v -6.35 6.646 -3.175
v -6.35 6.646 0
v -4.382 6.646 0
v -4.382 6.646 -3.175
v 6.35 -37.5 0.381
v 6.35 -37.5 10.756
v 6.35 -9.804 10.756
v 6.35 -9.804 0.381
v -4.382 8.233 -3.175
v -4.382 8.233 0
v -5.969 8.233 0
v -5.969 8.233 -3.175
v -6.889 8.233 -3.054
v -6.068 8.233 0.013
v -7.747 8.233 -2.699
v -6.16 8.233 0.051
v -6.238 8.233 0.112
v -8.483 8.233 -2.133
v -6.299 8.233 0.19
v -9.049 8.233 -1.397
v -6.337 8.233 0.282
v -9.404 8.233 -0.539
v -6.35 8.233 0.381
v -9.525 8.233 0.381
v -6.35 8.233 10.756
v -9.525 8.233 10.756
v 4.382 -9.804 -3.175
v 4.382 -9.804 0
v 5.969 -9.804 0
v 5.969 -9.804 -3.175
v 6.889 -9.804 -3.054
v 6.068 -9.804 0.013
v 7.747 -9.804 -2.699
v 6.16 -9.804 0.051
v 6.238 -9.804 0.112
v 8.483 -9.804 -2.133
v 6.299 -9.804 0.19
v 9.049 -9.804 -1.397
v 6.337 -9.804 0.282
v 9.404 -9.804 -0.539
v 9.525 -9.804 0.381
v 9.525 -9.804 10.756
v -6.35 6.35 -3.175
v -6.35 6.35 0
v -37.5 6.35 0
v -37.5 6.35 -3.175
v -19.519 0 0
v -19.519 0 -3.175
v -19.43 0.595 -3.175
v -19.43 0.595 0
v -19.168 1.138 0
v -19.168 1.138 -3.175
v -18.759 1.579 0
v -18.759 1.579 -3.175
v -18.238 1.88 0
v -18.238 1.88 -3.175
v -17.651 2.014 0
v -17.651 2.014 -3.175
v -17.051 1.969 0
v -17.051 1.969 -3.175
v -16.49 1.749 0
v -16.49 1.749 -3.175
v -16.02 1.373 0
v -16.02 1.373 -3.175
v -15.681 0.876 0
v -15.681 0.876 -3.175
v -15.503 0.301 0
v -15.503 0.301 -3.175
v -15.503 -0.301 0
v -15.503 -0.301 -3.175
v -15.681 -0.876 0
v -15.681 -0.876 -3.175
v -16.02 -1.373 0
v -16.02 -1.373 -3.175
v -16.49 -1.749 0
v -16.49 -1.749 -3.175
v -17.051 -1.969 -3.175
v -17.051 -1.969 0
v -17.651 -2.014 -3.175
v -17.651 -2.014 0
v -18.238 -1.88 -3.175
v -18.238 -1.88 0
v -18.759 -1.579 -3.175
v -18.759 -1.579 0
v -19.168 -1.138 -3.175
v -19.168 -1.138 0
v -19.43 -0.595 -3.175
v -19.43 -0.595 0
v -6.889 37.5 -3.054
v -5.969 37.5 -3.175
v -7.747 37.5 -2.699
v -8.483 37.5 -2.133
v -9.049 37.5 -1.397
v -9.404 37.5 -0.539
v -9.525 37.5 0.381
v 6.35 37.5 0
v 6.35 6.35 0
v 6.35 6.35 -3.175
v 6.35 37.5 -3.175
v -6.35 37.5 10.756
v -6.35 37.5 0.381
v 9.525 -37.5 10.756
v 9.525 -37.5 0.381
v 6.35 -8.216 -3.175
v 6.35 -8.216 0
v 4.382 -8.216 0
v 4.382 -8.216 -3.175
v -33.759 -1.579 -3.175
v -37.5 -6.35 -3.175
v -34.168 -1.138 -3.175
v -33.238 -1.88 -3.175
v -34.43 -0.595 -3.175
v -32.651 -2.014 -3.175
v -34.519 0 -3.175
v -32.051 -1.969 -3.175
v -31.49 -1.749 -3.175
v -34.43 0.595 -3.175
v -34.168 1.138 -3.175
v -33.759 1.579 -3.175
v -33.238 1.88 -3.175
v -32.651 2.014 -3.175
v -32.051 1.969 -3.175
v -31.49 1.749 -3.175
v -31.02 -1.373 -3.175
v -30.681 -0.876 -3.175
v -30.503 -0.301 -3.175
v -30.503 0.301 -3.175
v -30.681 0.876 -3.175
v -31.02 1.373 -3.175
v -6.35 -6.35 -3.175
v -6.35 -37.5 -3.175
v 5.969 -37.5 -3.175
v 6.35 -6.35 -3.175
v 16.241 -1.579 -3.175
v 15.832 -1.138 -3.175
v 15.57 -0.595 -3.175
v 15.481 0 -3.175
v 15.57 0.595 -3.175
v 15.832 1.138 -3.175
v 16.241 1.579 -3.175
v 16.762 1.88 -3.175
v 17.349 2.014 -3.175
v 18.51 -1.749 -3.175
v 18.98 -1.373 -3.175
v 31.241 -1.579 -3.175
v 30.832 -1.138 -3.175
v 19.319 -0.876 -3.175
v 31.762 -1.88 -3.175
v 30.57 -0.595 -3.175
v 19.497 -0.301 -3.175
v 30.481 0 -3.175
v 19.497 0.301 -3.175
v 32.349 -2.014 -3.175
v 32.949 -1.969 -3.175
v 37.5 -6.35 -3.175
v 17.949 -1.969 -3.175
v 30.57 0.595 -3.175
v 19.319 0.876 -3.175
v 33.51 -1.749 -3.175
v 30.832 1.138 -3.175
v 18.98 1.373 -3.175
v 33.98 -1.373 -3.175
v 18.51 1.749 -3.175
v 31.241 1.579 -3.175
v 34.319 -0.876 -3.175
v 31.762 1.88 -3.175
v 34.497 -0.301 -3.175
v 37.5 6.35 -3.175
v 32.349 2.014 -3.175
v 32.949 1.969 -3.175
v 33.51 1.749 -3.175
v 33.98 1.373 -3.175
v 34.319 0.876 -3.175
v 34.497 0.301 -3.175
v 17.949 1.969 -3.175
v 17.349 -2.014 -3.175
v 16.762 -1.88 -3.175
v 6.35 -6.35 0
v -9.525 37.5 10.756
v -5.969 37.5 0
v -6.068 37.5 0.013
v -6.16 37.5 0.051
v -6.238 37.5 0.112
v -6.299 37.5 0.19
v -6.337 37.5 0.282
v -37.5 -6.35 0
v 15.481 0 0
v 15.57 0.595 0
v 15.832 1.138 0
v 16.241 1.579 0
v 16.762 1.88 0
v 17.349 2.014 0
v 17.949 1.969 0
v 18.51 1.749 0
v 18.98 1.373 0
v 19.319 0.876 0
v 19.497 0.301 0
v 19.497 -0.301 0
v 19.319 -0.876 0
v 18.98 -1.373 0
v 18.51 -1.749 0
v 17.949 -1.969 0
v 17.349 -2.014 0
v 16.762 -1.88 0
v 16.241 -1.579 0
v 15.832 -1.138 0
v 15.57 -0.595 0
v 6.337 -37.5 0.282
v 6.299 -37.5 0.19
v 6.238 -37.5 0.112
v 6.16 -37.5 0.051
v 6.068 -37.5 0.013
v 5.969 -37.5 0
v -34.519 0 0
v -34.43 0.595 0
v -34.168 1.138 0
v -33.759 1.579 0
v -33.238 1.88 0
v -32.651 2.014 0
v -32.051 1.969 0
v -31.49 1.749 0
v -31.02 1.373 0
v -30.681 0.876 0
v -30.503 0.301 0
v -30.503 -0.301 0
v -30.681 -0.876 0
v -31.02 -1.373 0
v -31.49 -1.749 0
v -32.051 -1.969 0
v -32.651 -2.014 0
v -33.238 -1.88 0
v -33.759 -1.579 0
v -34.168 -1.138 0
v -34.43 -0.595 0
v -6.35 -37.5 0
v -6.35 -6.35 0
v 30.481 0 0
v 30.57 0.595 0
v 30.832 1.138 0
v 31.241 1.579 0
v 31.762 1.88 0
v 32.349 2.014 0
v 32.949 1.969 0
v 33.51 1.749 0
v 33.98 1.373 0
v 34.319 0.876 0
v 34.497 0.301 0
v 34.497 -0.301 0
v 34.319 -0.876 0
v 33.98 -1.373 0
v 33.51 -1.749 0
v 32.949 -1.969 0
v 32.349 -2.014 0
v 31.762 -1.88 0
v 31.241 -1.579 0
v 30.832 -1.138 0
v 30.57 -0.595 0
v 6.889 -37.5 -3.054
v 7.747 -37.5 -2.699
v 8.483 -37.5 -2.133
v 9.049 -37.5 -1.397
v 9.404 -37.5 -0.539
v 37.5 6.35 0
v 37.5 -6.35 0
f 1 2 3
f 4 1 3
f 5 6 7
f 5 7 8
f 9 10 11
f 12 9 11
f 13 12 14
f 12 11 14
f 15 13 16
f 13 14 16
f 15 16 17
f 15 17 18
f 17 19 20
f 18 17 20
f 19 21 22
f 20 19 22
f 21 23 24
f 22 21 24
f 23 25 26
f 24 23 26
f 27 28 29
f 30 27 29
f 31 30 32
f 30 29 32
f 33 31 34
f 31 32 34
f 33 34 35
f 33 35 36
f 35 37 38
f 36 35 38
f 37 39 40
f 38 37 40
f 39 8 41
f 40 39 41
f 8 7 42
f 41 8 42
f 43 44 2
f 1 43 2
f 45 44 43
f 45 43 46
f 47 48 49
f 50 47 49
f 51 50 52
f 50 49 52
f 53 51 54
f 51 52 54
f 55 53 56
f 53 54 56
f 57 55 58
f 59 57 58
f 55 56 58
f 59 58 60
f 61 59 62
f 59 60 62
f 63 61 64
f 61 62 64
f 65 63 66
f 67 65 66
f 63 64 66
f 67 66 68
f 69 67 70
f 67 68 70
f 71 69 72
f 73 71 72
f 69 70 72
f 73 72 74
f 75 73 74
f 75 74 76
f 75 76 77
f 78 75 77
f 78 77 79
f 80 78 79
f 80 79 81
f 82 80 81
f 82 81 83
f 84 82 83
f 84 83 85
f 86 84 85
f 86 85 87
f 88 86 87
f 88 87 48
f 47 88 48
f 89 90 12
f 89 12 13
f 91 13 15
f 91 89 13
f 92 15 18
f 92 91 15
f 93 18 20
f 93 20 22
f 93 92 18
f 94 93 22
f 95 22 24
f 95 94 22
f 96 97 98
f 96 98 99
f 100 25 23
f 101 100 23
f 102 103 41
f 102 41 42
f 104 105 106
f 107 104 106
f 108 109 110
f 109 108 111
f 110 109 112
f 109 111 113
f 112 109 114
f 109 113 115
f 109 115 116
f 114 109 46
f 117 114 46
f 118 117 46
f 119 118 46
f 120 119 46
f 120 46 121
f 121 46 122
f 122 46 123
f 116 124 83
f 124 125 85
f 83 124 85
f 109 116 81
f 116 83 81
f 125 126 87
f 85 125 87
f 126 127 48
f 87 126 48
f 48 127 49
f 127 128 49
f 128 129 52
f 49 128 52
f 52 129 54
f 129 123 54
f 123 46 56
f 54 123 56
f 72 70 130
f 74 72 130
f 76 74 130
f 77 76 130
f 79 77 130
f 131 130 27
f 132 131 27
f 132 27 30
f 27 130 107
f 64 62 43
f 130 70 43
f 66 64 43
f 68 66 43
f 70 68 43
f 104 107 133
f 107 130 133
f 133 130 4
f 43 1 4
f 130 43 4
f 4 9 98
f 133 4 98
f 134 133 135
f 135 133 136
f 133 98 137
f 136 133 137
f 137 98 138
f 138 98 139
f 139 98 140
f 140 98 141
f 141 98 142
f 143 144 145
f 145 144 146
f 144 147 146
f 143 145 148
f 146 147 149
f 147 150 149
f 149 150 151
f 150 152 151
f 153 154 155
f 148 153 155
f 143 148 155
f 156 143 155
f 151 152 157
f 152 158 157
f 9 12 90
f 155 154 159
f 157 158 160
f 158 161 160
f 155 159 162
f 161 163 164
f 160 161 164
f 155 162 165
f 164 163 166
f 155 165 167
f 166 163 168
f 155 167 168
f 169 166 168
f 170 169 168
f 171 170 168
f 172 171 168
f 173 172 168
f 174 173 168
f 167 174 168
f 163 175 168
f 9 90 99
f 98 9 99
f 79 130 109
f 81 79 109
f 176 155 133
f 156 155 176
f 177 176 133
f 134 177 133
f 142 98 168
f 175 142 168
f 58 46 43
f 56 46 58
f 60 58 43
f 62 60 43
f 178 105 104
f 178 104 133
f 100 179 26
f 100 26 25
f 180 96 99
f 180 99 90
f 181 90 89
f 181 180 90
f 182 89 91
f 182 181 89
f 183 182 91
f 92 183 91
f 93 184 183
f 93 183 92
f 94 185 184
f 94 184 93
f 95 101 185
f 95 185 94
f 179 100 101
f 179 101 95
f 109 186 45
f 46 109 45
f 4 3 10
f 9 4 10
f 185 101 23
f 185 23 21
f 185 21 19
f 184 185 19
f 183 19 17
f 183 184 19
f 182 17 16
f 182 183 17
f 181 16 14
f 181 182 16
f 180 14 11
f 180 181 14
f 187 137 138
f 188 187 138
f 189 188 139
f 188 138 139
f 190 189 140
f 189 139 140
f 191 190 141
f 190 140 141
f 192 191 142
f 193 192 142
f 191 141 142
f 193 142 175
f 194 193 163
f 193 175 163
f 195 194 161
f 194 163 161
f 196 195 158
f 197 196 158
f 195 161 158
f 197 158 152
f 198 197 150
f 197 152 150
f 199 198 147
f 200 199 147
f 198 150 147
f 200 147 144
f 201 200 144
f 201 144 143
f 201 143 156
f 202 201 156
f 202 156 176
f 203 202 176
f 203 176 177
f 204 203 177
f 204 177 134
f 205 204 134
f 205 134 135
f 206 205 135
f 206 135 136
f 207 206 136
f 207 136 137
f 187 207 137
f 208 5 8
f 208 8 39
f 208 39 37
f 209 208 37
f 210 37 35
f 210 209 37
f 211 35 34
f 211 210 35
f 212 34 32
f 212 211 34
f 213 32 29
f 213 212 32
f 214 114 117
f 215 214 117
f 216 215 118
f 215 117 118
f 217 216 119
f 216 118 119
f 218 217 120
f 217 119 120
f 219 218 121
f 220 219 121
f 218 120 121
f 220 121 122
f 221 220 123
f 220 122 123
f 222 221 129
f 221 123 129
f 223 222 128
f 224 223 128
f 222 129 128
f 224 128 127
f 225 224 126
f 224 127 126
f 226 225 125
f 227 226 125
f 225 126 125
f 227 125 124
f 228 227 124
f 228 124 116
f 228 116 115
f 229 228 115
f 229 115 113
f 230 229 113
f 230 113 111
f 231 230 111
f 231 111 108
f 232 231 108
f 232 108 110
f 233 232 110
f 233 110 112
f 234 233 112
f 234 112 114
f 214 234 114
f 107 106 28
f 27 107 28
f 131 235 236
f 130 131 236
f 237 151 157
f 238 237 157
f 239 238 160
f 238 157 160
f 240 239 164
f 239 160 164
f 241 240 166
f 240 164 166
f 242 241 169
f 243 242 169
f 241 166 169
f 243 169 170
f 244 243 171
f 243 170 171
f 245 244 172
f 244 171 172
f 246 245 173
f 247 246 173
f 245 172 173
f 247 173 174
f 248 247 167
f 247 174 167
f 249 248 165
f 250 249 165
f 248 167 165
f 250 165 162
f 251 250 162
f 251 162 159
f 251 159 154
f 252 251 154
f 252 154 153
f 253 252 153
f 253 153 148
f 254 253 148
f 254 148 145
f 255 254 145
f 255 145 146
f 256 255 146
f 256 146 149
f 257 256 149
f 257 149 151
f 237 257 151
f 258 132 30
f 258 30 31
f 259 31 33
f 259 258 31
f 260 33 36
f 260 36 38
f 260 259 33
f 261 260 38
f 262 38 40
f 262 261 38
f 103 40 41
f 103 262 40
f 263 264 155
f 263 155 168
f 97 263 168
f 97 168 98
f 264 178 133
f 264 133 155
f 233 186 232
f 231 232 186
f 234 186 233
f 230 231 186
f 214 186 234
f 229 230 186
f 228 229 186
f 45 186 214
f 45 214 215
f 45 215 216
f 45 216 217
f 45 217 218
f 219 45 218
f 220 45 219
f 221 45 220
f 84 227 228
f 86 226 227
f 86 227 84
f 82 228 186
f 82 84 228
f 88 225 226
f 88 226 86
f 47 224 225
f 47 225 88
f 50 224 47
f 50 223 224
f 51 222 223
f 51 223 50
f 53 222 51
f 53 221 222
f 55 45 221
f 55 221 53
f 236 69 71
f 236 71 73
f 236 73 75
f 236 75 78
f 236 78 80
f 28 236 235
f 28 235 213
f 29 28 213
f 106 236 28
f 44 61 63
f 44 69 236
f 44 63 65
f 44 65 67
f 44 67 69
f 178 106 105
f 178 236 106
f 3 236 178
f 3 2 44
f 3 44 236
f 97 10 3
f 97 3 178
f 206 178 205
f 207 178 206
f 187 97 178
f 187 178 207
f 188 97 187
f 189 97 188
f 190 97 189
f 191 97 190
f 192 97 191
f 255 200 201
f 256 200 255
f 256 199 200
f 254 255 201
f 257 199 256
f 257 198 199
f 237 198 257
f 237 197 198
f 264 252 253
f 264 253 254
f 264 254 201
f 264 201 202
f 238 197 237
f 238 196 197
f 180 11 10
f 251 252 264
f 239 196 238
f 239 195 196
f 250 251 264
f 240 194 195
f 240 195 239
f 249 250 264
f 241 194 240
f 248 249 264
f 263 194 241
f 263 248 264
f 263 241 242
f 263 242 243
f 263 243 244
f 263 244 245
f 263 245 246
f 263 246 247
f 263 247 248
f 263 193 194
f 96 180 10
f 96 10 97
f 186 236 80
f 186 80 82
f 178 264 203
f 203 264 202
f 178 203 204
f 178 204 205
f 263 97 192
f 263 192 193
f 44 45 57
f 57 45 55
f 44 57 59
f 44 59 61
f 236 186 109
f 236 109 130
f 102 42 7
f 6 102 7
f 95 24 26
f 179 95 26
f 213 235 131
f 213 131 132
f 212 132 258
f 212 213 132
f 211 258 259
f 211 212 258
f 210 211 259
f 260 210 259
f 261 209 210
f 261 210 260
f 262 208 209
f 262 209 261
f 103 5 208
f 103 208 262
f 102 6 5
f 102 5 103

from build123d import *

# Parameters (mm, degrees)
SKETCH1_W                       = 31.15
SKETCH1_H                       = 12.7
SKETCH1_W_2                     = 12.7
SKETCH1_H_2                     = 31.15
BOSS_EXTRUDE1_DEPTH             = 3.175
F_10_32_TAPPED_HOLE1_D          = 4.0386
F_10_32_TAPPED_HOLE1_DEPTH      = 12.7
F_10_32_TAPPED_HOLE1_TIP        = 1.213317848
EDGE_FLANGE1_STRIP_W            = 13.462
EDGE_FLANGE1_STRIP_H            = 3.175
EDGE_FLANGE1_STRIP_CUT_DEPTH    = 27.696197319
EDGE_FLANGE1_RELIEF_W           = 15.0495
EDGE_FLANGE1_RELIEF_H           = 1.5875
EDGE_FLANGE1_RELIEF_CUT_DEPTH   = 3.175
EDGE_FLANGE1_STRIP_2_W          = 13.462
EDGE_FLANGE1_STRIP_2_H          = 3.175
EDGE_FLANGE1_STRIP_CUT_2_DEPTH  = 29.266530926
EDGE_FLANGE1_RELIEF_2_W         = 15.0495
EDGE_FLANGE1_RELIEF_2_H         = 1.5875
EDGE_FLANGE1_RELIEF_CUT_2_DEPTH = 3.175
EDGE_FLANGE1_DEPTH              = 27.696197319
EDGE_FLANGE1_BEND_DEPTH         = 29.266530926


# Sheet-metal steps are written as plain solids
with BuildPart() as part:
    # Sketch1 → Boss-Extrude1 (new body)
    with BuildSketch(Plane.XY):
        with Locations((-21.925, 0)):
            Rectangle(SKETCH1_W, SKETCH1_H)
        Rectangle(SKETCH1_W_2, SKETCH1_H)
        with Locations((0, -21.925)):
            Rectangle(SKETCH1_W_2, SKETCH1_H_2)
        with Locations((21.925, 0)):
            Rectangle(SKETCH1_W, SKETCH1_H)
        with Locations((0, 21.925)):
            Rectangle(SKETCH1_W_2, SKETCH1_H_2)
    extrude(amount=-BOSS_EXTRUDE1_DEPTH)

    # #10-32 Tapped Hole1
    with Locations(Plane.XY):
        with Locations((-17.5, 0), (-32.5, 0), (17.5, 0), (32.5, 0)):
            Hole(F_10_32_TAPPED_HOLE1_D / 2, depth=F_10_32_TAPPED_HOLE1_DEPTH)
            with Locations((0, 0, -(F_10_32_TAPPED_HOLE1_DEPTH + F_10_32_TAPPED_HOLE1_TIP / 2))):  # 118° drill point
                Cone(0, F_10_32_TAPPED_HOLE1_D / 2, F_10_32_TAPPED_HOLE1_TIP, mode=Mode.SUBTRACT)

    # Edge-Flange1 strip (across the edge) → Edge-Flange1 strip cut (cut)
    with BuildSketch(Plane(origin=(6.35, -37.5, 0), x_dir=(-1, 0, 0), z_dir=(0, 1, 0))):
        with Locations((-6.35, -1.5875)):
            Rectangle(EDGE_FLANGE1_STRIP_W, EDGE_FLANGE1_STRIP_H)
    extrude(amount=EDGE_FLANGE1_STRIP_CUT_DEPTH, mode=Mode.SUBTRACT)

    # Edge-Flange1 relief (on the sheet) → Edge-Flange1 relief cut (cut)
    with BuildSketch(Plane(origin=(5.969, -37.5, 0), x_dir=(-1, 0, 0), z_dir=(0, 0, 1))):
        with Locations((-5.93725, -28.489947319)):
            Rectangle(EDGE_FLANGE1_RELIEF_W, EDGE_FLANGE1_RELIEF_H)
    extrude(amount=-EDGE_FLANGE1_RELIEF_CUT_DEPTH, mode=Mode.SUBTRACT)

    # Edge-Flange1 strip 2 (across the edge) → Edge-Flange1 strip cut 2 (cut)
    with BuildSketch(Plane(origin=(-6.35, 37.5, 0), x_dir=(1, 0, 0), z_dir=(0, -1, 0))):
        with Locations((-6.35, -1.5875)):
            Rectangle(EDGE_FLANGE1_STRIP_2_W, EDGE_FLANGE1_STRIP_2_H)
    extrude(amount=EDGE_FLANGE1_STRIP_CUT_2_DEPTH, mode=Mode.SUBTRACT)

    # Edge-Flange1 relief 2 (on the sheet) → Edge-Flange1 relief cut 2 (cut)
    with BuildSketch(Plane(origin=(-5.969, 37.5, 0), x_dir=(1, 0, 0), z_dir=(0, 0, 1))):
        with Locations((-5.93725, -30.060280926)):
            Rectangle(EDGE_FLANGE1_RELIEF_2_W, EDGE_FLANGE1_RELIEF_2_H)
    extrude(amount=-EDGE_FLANGE1_RELIEF_CUT_2_DEPTH, mode=Mode.SUBTRACT)

    # Edge-Flange1 section (across the edge) → Edge-Flange1 (add)
    with BuildSketch(Plane(origin=(6.35, -37.5, 0), x_dir=(-1, 0, 0), z_dir=(0, 1, 0))):
        with BuildLine():
            Line((-3.175, 0.381), (-3.175, 10.756))
            Line((-3.175, 10.756), (0, 10.756))
            Line((0, 10.756), (0, 0.381))
            ThreePointArc((0, 0.381), (0.111592316, 0.111592316), (0.381, 0))
            Line((0.381, 0), (0.381, -3.175))
            ThreePointArc((0.381, -3.175), (-2.133471714, -2.133471714), (-3.175, 0.381))
        make_face()
    extrude(amount=EDGE_FLANGE1_DEPTH)

    # Edge-Flange1 section 2 (across the edge) → Edge-Flange1 bend (add)
    with BuildSketch(Plane(origin=(-6.35, 37.5, 0), x_dir=(1, 0, 0), z_dir=(0, -1, 0))):
        with BuildLine():
            Line((-3.175, 0.381), (-3.175, 10.756))
            Line((-3.175, 10.756), (0, 10.756))
            Line((0, 10.756), (0, 0.381))
            ThreePointArc((0, 0.381), (0.111592316, 0.111592316), (0.381, 0))
            Line((0.381, 0), (0.381, -3.175))
            ThreePointArc((0.381, -3.175), (-2.133471714, -2.133471714), (-3.175, 0.381))
        make_face()
    extrude(amount=EDGE_FLANGE1_BEND_DEPTH)


solid = part.part
